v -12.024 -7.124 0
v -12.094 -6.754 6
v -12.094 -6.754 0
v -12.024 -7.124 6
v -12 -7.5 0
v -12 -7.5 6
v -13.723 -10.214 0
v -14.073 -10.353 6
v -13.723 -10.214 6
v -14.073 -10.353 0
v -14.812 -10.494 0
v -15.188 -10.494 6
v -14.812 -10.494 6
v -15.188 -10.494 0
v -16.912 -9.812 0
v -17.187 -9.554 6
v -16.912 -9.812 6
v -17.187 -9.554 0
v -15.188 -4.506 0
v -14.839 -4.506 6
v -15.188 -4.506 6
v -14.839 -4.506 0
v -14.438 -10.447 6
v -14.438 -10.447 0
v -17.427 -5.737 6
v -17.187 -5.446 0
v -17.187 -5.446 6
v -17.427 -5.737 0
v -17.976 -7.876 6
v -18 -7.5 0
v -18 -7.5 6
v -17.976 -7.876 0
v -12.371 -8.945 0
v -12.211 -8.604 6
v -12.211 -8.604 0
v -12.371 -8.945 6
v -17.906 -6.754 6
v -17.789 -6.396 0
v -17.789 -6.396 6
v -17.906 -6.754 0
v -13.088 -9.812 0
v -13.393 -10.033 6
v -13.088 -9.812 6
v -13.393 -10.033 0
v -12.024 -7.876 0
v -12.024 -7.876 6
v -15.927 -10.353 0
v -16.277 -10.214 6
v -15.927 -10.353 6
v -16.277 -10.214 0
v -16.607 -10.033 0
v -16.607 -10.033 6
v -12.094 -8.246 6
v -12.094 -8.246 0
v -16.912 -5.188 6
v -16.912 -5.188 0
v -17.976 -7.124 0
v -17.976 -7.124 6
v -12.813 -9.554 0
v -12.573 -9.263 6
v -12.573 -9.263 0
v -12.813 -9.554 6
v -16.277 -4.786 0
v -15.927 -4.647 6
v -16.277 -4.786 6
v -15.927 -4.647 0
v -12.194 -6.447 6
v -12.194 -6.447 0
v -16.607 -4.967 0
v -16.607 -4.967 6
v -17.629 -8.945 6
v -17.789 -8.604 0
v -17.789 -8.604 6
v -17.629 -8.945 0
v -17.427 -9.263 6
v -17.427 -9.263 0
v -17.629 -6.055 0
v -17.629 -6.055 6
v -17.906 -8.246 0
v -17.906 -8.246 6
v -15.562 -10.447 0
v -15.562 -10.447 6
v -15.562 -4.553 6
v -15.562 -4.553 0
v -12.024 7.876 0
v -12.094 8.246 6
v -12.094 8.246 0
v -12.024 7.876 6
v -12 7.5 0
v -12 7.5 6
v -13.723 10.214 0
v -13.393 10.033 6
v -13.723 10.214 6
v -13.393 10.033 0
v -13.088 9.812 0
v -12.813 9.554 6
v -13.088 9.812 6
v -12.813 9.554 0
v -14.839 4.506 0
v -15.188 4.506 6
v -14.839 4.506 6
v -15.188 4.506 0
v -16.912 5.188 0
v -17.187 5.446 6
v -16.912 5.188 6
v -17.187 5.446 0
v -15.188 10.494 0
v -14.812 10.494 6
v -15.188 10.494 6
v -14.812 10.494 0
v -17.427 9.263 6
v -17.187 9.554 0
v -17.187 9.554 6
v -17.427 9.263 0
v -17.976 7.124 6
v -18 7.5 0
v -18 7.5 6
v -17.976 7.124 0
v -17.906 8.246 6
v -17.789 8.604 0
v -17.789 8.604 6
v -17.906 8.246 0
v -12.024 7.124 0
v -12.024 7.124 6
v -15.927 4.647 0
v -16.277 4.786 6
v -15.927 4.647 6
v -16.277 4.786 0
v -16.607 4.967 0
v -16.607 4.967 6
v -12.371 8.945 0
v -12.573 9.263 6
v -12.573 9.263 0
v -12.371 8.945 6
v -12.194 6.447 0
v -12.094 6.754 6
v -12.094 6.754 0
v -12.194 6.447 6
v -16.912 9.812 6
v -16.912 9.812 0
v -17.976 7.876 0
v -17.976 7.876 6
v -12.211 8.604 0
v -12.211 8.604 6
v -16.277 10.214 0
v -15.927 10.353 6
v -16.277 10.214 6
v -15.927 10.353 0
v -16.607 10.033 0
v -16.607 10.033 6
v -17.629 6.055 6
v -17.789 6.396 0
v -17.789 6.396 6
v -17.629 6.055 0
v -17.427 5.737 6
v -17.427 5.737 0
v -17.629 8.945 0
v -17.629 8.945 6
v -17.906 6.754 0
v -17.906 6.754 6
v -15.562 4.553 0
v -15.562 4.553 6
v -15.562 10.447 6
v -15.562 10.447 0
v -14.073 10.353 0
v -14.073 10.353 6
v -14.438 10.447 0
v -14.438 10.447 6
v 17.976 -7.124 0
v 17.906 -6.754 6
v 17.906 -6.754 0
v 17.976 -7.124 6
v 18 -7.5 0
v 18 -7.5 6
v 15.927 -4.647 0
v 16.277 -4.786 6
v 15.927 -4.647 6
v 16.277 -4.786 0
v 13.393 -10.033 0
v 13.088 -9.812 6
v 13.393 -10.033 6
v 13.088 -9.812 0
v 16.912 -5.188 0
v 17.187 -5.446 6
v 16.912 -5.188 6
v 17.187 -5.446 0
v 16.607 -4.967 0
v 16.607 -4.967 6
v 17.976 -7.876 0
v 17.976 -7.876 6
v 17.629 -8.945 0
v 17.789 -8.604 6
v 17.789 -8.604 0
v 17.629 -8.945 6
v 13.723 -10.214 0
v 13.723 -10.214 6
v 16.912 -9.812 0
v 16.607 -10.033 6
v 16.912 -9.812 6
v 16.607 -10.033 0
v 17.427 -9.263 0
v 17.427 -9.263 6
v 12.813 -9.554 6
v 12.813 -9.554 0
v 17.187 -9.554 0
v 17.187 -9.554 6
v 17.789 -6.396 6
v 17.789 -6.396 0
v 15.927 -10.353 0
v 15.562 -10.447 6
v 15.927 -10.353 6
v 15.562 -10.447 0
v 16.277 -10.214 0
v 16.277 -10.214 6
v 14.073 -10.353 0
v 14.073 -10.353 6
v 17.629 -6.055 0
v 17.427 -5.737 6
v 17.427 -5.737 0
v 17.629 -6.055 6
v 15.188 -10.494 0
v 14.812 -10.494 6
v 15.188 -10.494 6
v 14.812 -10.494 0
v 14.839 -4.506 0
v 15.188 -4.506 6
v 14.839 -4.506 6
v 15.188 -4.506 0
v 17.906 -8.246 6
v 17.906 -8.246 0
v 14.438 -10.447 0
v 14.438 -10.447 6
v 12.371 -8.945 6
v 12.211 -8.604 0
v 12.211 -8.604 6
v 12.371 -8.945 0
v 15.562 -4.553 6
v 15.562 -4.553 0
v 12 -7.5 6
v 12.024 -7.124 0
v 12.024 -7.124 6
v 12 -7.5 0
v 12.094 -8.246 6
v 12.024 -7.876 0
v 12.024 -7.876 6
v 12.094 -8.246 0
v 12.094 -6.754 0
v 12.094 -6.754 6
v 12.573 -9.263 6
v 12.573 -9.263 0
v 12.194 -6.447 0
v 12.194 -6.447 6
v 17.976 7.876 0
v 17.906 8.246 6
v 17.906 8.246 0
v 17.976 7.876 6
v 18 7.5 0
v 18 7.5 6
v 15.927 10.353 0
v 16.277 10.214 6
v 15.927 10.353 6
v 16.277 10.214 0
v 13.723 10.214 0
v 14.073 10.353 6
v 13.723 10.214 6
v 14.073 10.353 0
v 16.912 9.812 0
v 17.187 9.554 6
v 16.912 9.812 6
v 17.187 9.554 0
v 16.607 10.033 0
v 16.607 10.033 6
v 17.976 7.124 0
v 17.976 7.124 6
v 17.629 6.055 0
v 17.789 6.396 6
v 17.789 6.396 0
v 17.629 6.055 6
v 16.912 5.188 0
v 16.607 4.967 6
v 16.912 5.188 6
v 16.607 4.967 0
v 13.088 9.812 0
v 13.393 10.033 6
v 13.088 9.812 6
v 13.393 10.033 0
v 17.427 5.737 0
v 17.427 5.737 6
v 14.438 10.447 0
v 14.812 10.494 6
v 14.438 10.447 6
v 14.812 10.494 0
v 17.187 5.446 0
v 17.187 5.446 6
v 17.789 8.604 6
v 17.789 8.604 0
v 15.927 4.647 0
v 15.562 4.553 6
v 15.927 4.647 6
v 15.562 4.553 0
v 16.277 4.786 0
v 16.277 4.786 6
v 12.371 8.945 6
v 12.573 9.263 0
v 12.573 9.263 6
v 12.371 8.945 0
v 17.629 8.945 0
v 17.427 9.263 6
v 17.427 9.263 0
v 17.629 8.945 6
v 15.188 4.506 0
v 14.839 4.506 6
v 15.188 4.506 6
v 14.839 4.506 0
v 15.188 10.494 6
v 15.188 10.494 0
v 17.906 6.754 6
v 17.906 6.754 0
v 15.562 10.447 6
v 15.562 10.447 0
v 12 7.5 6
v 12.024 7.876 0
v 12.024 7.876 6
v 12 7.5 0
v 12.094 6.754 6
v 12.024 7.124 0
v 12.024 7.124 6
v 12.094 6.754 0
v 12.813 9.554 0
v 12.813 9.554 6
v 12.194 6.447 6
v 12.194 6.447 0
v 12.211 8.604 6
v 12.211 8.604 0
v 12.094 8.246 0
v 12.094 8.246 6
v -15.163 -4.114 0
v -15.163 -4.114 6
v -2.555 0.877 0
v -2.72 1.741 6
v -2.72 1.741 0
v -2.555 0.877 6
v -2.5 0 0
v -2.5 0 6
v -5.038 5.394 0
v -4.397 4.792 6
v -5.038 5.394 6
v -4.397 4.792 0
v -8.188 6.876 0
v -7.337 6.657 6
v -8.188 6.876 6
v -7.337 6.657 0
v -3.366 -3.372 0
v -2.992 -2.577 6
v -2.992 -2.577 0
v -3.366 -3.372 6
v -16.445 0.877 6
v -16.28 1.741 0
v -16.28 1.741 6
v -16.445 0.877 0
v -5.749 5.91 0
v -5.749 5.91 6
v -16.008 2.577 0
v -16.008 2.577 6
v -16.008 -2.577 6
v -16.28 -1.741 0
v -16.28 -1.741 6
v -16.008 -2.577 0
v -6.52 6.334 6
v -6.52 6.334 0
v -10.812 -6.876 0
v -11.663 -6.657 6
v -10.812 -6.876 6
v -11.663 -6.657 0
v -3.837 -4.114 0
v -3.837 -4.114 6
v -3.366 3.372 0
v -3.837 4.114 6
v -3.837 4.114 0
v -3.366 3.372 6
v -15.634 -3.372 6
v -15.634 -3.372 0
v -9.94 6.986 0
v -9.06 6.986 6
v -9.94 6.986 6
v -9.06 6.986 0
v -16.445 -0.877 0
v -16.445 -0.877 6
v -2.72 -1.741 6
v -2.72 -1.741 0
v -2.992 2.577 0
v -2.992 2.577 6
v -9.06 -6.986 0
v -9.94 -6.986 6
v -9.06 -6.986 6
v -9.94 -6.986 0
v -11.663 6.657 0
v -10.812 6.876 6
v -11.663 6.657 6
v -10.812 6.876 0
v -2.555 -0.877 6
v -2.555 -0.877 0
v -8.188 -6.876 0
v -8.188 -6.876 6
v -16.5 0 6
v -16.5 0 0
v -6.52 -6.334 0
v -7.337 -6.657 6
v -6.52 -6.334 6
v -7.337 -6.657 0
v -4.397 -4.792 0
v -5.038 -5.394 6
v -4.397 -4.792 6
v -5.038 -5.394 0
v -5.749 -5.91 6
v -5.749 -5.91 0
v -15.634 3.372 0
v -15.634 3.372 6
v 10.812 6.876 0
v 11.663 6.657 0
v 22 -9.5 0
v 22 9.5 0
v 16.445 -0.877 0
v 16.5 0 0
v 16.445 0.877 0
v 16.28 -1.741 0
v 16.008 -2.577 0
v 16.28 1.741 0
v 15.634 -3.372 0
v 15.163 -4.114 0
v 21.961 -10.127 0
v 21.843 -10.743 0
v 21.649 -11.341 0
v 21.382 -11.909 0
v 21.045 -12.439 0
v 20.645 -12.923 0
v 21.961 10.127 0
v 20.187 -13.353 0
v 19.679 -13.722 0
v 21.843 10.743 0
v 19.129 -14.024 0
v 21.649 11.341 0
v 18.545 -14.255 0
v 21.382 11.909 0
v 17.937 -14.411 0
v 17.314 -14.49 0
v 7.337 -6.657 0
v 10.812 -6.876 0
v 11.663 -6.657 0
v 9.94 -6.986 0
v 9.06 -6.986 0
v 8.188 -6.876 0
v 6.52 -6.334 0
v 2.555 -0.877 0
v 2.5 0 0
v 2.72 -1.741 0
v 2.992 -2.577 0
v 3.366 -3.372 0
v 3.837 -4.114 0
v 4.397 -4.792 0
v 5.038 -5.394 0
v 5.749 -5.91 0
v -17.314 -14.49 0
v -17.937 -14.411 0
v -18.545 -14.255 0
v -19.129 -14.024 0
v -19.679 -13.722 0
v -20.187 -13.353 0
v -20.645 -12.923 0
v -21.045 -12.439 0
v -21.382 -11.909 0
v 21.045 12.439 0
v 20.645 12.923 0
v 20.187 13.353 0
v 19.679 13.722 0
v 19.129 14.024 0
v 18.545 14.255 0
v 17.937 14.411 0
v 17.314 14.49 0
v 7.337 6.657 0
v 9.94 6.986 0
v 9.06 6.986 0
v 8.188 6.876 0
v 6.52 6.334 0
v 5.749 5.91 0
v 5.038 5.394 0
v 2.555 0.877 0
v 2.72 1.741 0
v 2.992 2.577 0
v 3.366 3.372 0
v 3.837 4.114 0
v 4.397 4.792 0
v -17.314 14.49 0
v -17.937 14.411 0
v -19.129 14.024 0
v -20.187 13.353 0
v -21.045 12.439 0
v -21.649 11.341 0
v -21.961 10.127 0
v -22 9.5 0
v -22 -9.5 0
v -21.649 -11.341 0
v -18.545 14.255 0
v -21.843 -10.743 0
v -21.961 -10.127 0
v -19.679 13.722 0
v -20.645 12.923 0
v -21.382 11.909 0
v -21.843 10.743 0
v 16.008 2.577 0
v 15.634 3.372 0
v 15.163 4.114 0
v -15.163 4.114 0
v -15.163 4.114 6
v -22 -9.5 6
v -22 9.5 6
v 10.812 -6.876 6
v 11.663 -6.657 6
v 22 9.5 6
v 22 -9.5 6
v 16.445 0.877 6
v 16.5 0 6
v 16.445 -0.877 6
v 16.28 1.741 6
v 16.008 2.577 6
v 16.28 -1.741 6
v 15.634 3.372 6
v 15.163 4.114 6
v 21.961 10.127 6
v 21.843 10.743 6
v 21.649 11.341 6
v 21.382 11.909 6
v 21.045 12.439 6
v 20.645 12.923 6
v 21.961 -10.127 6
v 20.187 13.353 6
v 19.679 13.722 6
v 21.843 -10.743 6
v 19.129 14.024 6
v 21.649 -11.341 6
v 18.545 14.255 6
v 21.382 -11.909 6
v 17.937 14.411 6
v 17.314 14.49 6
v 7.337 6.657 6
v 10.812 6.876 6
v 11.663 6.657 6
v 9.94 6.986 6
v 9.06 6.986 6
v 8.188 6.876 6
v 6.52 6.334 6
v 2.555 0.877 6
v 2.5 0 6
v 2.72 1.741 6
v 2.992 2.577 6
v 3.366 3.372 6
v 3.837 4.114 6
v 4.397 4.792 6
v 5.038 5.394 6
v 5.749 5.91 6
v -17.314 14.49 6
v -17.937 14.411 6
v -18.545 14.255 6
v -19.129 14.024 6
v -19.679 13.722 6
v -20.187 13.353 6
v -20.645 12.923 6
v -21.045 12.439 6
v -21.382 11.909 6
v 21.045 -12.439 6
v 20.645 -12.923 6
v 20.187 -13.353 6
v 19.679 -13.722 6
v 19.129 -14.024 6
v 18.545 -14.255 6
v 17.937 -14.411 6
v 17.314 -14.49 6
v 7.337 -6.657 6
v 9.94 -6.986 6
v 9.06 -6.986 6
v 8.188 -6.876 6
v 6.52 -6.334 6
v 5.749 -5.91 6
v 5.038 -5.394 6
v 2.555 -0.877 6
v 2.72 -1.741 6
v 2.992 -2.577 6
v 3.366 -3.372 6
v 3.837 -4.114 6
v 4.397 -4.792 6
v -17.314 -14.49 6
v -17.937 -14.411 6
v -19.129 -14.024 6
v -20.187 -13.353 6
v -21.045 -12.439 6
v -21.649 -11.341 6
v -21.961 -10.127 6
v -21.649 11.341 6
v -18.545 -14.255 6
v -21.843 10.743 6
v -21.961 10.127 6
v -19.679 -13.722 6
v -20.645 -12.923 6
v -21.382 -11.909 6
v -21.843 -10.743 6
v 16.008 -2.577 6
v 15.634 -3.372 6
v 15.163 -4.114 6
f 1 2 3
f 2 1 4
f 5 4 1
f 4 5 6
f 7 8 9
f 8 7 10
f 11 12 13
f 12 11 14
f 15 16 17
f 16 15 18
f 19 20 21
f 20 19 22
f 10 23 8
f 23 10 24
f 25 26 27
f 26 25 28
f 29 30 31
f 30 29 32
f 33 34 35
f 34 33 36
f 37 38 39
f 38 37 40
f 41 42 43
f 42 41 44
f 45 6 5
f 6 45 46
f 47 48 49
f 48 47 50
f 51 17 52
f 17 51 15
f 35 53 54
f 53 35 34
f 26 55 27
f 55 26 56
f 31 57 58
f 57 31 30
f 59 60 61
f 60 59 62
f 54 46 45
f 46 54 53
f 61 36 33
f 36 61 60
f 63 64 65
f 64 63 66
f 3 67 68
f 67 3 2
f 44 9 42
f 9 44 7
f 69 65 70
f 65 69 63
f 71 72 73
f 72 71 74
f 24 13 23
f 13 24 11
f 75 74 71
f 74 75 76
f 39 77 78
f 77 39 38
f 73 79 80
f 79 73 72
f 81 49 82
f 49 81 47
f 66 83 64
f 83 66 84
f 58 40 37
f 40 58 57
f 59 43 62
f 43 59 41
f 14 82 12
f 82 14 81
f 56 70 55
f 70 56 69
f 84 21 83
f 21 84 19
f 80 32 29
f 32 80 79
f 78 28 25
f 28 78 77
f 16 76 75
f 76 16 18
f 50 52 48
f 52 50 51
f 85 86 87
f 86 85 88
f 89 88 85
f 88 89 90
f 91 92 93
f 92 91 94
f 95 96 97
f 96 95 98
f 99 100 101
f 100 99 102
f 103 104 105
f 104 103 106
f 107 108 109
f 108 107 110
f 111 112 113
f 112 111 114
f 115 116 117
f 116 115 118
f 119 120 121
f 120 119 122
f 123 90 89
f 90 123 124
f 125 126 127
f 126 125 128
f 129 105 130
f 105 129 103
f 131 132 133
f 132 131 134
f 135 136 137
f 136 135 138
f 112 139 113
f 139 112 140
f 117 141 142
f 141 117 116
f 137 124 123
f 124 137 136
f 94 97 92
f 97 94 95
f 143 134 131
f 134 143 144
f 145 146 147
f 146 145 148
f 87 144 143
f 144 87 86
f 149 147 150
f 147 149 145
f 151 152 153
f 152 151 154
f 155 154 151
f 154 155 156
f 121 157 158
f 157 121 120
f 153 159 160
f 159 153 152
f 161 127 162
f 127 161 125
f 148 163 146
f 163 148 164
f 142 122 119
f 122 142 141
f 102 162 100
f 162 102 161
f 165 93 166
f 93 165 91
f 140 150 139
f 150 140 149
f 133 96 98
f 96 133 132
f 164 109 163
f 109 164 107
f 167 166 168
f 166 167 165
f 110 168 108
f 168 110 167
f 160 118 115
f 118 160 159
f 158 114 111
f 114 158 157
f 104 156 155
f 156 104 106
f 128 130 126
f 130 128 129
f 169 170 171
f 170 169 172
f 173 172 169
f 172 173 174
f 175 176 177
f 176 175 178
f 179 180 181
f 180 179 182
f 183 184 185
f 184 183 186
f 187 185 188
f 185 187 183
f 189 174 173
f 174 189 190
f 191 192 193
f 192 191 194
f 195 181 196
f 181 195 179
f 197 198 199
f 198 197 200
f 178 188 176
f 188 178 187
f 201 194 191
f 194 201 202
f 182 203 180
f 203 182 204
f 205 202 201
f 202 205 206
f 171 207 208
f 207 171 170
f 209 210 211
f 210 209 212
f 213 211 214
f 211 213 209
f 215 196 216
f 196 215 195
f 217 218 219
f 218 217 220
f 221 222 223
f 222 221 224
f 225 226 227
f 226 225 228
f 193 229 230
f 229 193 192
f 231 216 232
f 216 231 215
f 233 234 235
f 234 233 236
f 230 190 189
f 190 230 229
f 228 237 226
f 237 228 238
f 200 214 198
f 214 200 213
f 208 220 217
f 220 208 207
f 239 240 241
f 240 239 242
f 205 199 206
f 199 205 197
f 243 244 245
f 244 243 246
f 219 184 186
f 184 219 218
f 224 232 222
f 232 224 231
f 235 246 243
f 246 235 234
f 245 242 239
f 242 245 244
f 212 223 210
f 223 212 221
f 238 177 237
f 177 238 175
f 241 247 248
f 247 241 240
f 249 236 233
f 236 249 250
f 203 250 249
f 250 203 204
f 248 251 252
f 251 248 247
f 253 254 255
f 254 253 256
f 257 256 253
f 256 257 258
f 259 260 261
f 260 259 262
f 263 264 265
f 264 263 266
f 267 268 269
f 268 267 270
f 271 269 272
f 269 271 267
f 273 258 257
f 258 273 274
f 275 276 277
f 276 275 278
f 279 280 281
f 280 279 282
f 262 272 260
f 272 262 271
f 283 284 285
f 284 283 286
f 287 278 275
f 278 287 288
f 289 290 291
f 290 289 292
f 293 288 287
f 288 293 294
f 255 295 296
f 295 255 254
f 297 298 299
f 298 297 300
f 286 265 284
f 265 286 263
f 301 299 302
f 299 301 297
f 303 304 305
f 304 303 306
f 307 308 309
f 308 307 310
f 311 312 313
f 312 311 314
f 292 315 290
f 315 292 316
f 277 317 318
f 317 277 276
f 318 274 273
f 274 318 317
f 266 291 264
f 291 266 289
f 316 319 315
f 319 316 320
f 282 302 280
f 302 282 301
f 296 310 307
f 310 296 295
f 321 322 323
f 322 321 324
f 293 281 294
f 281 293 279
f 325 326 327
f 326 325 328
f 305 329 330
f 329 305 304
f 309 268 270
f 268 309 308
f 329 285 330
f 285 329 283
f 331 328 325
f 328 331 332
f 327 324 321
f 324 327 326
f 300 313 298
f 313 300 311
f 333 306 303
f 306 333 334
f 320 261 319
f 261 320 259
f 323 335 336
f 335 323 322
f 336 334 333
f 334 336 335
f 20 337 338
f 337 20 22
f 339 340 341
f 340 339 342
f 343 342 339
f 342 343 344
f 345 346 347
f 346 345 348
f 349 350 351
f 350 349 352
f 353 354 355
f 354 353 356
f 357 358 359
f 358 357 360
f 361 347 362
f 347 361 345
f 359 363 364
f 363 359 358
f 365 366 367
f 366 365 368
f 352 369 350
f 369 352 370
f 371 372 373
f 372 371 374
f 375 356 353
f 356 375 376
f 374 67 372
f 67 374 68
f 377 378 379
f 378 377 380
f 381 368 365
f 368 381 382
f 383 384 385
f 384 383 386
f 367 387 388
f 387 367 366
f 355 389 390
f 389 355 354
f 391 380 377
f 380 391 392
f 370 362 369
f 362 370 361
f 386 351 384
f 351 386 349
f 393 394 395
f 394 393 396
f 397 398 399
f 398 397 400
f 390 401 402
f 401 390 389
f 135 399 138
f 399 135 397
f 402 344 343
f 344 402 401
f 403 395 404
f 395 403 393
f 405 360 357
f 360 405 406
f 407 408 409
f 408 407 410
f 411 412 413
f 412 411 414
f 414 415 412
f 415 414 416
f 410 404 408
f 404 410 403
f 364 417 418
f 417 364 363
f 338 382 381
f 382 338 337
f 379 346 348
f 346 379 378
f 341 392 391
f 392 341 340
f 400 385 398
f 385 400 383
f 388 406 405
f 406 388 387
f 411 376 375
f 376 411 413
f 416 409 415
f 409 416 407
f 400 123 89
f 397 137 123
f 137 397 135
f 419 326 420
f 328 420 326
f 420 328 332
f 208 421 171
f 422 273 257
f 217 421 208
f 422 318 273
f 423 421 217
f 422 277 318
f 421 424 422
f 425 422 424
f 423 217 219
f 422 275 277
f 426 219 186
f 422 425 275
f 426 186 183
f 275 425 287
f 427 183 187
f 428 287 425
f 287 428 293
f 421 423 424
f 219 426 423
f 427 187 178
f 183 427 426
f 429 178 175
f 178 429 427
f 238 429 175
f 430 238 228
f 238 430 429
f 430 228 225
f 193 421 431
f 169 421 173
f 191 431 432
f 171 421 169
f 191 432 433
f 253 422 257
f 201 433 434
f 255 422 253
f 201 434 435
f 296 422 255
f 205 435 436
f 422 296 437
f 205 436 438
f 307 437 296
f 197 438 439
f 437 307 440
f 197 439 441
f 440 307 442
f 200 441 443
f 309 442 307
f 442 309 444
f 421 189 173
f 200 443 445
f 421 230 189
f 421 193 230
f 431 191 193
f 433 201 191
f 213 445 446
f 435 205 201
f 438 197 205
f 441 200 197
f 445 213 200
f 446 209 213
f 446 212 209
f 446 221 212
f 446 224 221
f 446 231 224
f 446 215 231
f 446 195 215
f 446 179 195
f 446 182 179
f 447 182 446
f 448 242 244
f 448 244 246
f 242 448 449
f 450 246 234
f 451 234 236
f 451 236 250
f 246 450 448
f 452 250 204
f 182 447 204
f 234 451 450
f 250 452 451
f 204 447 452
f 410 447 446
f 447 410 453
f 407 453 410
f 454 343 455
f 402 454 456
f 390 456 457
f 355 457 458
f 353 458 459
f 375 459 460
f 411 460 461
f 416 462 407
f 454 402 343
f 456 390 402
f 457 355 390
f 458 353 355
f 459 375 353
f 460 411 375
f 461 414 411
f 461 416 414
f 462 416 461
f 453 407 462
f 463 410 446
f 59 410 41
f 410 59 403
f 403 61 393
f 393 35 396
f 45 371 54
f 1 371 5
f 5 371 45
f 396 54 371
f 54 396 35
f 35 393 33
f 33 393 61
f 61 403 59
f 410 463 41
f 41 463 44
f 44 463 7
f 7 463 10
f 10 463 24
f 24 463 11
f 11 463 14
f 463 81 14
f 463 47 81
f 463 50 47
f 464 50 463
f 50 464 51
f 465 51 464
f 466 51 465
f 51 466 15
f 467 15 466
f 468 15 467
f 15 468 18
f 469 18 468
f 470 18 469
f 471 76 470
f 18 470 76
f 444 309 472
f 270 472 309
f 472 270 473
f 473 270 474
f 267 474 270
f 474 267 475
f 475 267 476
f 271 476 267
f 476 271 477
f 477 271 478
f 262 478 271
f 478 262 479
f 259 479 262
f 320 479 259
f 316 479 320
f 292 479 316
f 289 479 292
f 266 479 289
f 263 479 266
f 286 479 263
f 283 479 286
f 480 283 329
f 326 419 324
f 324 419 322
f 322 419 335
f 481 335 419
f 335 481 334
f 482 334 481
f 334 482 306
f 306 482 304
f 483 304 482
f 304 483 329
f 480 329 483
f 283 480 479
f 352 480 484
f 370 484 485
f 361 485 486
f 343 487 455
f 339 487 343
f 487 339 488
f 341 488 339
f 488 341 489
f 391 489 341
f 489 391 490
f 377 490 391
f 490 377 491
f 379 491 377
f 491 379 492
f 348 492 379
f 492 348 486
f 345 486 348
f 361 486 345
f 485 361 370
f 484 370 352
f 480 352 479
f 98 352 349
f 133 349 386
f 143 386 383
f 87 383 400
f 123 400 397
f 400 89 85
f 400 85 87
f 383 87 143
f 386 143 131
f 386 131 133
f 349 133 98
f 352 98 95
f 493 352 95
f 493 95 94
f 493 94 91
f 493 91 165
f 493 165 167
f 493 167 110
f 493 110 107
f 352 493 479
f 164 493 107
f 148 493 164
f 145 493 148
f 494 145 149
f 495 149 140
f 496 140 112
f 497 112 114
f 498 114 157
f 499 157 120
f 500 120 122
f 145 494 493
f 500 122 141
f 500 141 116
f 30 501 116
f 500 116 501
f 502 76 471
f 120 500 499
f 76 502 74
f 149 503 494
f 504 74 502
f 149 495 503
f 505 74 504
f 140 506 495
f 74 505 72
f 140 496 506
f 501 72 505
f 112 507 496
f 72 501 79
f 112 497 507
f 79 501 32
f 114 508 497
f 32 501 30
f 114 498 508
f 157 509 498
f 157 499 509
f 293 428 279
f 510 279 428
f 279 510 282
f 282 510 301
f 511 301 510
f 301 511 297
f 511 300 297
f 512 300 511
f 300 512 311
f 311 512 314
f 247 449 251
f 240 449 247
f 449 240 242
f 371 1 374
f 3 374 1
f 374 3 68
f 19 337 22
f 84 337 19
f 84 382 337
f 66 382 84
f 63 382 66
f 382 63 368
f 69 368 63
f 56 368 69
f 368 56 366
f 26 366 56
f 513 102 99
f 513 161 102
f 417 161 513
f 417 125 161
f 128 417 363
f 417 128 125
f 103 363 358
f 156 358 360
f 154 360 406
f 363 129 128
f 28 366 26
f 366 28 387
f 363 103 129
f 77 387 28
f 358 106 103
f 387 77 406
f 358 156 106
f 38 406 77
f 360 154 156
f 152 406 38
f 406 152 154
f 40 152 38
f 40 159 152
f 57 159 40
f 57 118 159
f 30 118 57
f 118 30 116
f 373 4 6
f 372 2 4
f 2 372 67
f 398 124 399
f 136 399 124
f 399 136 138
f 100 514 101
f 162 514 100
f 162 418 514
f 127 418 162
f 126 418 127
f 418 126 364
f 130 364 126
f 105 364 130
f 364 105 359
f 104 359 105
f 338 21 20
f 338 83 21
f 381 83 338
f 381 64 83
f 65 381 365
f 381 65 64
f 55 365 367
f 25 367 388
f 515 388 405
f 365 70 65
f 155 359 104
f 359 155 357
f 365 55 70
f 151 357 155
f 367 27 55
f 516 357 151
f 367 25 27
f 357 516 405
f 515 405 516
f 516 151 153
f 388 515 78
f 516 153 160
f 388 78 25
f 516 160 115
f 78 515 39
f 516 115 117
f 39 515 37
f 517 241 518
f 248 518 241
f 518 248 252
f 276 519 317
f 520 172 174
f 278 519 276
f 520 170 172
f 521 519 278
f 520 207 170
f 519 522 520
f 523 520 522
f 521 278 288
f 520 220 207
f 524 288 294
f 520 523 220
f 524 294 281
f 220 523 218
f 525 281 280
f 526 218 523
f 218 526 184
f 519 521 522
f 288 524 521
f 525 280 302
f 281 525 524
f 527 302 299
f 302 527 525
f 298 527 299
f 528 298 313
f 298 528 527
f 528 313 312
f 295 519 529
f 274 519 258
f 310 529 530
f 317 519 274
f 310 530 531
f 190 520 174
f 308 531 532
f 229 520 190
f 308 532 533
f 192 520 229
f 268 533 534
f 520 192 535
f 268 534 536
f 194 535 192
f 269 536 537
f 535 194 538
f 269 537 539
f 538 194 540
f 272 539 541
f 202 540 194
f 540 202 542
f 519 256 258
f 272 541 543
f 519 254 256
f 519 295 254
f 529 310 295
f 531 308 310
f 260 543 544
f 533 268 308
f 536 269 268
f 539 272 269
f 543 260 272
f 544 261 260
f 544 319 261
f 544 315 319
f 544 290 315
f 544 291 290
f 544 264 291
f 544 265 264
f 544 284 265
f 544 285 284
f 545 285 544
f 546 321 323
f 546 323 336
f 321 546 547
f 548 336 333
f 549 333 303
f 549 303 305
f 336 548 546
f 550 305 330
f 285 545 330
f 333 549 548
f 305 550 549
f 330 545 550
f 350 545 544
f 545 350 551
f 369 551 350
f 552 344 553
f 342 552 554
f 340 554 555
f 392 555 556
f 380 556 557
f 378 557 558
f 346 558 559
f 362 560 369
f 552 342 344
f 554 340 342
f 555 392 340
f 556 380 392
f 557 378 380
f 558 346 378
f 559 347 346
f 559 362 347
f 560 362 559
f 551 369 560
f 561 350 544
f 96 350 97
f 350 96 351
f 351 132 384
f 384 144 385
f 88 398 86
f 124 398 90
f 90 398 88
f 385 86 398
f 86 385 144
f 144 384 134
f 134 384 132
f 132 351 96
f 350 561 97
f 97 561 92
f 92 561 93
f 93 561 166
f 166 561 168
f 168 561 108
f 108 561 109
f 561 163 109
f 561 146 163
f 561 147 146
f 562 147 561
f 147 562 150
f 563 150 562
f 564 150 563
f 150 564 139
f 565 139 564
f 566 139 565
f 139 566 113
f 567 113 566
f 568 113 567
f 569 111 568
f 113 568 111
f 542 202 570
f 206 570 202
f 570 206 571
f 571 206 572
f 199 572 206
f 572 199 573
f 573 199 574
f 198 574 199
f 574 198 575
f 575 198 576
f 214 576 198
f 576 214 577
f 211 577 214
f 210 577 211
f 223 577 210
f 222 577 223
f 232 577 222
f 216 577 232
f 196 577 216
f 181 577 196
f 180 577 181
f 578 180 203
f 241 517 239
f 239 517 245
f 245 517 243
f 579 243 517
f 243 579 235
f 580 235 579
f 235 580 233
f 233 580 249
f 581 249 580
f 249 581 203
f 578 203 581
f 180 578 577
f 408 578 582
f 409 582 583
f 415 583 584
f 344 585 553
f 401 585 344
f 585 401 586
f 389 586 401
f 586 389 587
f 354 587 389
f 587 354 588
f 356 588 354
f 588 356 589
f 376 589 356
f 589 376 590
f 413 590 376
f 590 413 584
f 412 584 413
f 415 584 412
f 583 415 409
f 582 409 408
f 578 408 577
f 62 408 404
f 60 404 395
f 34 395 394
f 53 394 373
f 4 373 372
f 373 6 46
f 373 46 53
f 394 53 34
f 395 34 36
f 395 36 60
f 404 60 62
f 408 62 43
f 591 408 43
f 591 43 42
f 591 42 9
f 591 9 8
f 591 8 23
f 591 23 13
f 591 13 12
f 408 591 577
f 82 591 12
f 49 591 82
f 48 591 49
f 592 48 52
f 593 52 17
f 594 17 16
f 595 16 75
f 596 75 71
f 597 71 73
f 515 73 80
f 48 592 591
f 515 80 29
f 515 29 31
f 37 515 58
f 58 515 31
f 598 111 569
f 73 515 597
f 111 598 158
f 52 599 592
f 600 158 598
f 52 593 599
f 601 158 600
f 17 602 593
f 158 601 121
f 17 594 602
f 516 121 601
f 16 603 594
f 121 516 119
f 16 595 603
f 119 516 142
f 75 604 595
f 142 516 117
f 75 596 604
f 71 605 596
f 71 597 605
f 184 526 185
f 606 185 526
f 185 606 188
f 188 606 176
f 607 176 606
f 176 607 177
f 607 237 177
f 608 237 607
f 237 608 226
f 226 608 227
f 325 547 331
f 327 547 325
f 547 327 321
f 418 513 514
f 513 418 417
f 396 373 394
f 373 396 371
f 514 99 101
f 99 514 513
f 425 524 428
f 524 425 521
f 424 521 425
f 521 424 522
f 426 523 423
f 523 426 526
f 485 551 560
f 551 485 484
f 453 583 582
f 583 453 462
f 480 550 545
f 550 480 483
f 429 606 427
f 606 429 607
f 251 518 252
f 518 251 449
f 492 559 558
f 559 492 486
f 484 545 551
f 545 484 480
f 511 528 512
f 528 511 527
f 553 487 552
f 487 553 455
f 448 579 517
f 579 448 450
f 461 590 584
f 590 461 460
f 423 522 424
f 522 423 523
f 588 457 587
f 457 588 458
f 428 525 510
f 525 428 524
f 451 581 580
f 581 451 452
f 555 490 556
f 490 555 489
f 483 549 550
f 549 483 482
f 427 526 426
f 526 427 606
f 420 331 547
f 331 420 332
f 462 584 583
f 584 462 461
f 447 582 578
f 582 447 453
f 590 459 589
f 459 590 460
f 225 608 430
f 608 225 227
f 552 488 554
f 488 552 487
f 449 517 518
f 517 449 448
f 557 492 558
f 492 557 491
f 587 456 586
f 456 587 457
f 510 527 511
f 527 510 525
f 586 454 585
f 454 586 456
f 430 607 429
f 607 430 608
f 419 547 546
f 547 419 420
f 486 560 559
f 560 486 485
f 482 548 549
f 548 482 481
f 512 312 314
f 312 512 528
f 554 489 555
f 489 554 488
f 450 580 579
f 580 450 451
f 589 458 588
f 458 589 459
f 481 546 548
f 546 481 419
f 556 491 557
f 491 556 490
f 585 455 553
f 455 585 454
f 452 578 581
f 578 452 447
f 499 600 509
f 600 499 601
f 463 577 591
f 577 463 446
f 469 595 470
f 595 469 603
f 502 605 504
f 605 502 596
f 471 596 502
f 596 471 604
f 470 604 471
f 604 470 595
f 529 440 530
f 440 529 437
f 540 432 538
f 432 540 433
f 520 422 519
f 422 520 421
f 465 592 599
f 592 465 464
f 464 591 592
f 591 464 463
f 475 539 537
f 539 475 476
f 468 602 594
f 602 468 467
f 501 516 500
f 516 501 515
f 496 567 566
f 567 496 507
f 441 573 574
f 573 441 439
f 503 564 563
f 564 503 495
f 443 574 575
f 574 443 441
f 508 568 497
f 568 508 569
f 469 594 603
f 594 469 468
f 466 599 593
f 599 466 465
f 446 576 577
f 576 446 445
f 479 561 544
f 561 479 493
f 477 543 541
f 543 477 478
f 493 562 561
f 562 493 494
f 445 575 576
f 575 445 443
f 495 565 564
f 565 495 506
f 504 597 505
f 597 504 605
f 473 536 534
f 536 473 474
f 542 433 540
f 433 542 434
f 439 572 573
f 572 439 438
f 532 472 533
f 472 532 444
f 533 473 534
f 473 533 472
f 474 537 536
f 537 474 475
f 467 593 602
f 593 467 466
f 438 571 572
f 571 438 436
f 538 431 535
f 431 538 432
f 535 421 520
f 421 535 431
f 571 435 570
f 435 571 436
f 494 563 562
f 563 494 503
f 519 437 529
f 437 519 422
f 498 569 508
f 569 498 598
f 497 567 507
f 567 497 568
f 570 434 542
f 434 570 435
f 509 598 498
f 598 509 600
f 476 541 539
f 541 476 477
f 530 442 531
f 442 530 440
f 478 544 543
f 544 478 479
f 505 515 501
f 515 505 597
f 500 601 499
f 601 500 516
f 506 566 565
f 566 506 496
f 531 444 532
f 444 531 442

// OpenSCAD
$fn = 50;


difference() {
	union() {
		hull() {
			translate(v = [-17.0000000000, 9.5000000000, 0]) {
				cylinder(h = 6, r = 5);
			}
			translate(v = [17.0000000000, 9.5000000000, 0]) {
				cylinder(h = 6, r = 5);
			}
			translate(v = [-17.0000000000, -9.5000000000, 0]) {
				cylinder(h = 6, r = 5);
			}
			translate(v = [17.0000000000, -9.5000000000, 0]) {
				cylinder(h = 6, r = 5);
			}
		}
	}
	union() {
		#translate(v = [-15.0000000000, -7.5000000000, -100.0000000000]) {
			cylinder(h = 200, r = 3.0000000000);
		}
		#translate(v = [-15.0000000000, 7.5000000000, -100.0000000000]) {
			cylinder(h = 200, r = 3.0000000000);
		}
		#translate(v = [15.0000000000, -7.5000000000, -100.0000000000]) {
			cylinder(h = 200, r = 3.0000000000);
		}
		#translate(v = [15.0000000000, 7.5000000000, -100.0000000000]) {
			cylinder(h = 200, r = 3.0000000000);
		}
		#translate(v = [-9.5000000000, 0, 0]) {
			cylinder(h = 6, r = 7.0000000000);
		}
		#translate(v = [9.5000000000, 0, 0]) {
			cylinder(h = 6, r = 7.0000000000);
		}
	}
}
